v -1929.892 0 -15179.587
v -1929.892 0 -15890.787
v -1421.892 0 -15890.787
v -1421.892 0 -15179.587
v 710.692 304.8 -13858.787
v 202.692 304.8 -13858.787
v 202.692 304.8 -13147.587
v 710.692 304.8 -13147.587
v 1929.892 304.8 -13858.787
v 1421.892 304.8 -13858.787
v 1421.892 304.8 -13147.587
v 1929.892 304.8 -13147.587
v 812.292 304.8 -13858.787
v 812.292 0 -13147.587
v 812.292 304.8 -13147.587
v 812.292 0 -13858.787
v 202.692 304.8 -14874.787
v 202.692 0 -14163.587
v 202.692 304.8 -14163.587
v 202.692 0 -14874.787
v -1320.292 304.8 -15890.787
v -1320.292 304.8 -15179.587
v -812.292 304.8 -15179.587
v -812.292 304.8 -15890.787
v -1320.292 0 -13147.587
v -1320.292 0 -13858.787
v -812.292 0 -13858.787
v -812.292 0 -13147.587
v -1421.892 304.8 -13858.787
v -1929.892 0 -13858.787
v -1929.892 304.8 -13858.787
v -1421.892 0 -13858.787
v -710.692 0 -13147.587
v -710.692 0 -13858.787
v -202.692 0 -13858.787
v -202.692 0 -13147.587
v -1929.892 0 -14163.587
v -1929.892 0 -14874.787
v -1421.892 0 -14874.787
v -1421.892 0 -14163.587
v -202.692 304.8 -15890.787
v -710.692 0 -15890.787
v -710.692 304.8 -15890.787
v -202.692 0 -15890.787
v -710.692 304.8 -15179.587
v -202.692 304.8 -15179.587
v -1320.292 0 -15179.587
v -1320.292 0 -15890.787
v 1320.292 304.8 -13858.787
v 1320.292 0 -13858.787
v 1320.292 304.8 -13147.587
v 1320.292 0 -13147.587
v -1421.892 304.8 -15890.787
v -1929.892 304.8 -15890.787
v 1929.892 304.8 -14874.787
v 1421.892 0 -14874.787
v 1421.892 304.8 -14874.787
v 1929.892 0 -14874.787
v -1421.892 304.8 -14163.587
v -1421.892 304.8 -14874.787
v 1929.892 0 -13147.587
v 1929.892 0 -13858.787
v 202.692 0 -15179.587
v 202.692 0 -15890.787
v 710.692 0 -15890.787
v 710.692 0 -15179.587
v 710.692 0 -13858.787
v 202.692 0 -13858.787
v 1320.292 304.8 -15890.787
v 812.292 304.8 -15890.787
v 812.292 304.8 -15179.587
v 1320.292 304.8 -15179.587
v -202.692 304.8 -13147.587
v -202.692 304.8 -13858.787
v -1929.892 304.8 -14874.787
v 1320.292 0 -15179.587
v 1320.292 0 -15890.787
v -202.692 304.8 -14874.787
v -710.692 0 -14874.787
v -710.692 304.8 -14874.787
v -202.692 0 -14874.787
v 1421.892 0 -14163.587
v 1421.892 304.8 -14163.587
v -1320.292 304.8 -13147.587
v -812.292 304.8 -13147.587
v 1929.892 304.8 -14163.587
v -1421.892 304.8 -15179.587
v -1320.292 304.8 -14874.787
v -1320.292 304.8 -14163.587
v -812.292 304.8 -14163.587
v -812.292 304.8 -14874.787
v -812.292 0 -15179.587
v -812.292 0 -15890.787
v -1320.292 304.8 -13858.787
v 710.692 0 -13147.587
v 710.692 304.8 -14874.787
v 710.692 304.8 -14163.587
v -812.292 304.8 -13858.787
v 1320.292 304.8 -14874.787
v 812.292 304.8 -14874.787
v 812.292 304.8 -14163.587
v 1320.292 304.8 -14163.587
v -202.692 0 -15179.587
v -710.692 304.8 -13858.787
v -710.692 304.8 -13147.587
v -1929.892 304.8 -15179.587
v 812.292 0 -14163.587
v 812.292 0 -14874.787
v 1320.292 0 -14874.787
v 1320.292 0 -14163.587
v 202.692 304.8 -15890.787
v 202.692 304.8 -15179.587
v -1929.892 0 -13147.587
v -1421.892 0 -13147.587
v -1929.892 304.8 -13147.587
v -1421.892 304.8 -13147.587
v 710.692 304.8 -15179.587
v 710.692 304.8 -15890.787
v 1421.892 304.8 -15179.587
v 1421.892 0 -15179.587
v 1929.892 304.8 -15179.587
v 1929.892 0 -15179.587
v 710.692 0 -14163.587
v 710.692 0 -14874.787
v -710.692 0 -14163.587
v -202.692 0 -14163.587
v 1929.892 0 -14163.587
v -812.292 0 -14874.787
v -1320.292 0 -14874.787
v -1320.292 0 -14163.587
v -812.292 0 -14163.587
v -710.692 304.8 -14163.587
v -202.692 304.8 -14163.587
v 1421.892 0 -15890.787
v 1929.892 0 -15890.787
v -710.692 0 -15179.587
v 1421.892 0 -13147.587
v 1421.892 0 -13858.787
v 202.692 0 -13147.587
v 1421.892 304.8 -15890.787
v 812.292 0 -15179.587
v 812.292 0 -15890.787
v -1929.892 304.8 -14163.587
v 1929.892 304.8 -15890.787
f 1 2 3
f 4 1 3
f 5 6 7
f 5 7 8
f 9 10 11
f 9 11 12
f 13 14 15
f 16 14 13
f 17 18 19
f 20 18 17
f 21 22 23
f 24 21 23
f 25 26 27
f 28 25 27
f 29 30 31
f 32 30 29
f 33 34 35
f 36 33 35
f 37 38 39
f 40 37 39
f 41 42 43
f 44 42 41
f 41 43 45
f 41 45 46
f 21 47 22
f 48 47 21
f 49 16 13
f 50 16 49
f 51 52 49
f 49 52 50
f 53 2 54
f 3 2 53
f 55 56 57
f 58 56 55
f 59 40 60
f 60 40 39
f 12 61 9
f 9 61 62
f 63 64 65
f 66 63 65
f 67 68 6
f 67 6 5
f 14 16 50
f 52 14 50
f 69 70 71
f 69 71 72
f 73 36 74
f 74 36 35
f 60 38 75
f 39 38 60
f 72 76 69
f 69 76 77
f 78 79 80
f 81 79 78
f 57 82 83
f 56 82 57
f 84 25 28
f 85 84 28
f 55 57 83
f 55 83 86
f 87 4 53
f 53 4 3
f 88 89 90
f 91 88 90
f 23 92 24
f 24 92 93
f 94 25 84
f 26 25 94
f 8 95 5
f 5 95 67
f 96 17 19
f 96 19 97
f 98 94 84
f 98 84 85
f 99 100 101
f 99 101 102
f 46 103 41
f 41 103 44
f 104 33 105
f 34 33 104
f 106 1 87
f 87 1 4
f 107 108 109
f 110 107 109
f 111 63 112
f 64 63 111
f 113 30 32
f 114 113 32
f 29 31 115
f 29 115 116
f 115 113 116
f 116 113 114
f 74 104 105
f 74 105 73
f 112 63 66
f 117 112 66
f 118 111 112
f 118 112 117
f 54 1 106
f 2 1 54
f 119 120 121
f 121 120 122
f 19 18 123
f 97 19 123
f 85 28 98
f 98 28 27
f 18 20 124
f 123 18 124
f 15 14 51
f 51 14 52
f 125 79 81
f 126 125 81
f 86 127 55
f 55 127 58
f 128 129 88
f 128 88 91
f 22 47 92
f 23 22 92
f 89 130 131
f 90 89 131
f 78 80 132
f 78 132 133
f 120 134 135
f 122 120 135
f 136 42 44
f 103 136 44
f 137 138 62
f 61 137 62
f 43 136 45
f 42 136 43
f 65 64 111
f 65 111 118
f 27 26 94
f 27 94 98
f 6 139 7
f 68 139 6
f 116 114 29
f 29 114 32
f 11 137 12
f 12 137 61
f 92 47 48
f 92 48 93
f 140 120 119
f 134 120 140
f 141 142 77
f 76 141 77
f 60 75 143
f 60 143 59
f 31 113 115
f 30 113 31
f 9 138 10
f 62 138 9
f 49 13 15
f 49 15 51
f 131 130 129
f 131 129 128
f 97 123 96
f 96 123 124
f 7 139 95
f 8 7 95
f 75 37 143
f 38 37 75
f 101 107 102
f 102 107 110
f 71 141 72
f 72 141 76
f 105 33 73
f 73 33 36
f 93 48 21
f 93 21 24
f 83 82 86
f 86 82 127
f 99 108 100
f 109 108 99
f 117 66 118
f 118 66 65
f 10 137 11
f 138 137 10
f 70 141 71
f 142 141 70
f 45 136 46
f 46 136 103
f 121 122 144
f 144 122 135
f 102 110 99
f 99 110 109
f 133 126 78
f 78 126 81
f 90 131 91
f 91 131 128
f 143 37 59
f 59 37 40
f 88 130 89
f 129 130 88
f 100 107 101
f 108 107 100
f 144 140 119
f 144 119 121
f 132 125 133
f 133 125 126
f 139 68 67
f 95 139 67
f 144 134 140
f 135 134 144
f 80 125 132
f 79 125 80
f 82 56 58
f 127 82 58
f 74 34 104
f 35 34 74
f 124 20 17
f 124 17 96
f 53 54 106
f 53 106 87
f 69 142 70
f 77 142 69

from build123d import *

# Parameters (mm, degrees)
FIRST_CLASS_SEAT_2_W       = 508.000000102
FIRST_CLASS_SEAT_2_H       = 711.199999899
FIRST_CLASS_SEAT_DEPTH     = 304.8
FIRST_CLASS_SEAT_2_2_DEPTH = 304.8
FIRST_CLASS_SEAT_2_W_2     = 508.000000101
FIRST_CLASS_SEAT_3_DEPTH   = 304.8
FIRST_CLASS_SEAT_2_H_2     = 711.199999898
FIRST_CLASS_SEAT_4_DEPTH   = 304.8
FIRST_CLASS_SEAT_5_DEPTH   = 304.8
FIRST_CLASS_SEAT_6_DEPTH   = 304.8
FIRST_CLASS_SEAT_7_DEPTH   = 304.8
FIRST_CLASS_SEAT_8_DEPTH   = 304.8
FIRST_CLASS_SEAT_9_DEPTH   = 304.8
FIRST_CLASS_SEAT_10_DEPTH  = 304.8
FIRST_CLASS_SEAT_11_DEPTH  = 304.8
FIRST_CLASS_SEAT_12_DEPTH  = 304.8
FIRST_CLASS_SEAT_13_DEPTH  = 304.8
FIRST_CLASS_SEAT_14_DEPTH  = 304.8
FIRST_CLASS_SEAT_15_DEPTH  = 304.8
FIRST_CLASS_SEAT_16_DEPTH  = 304.8
FIRST_CLASS_SEAT_17_DEPTH  = 304.8
FIRST_CLASS_SEAT_18_DEPTH  = 304.8


with BuildPart() as part:
    # First Class Seat 2 → First Class Seat (new body)
    with BuildSketch(Plane(origin=(0, 0, 0), x_dir=(1, 0, 0), z_dir=(0, 1, 0))):
        with Locations((-1066.291998811, 13503.187169787)):
            Rectangle(FIRST_CLASS_SEAT_2_W, FIRST_CLASS_SEAT_2_H)
    extrude(amount=FIRST_CLASS_SEAT_DEPTH)


with BuildPart() as body_2:
    # First Class Seat 2 → First Class Seat 2 2 (new body)
    with BuildSketch(Plane(origin=(0, 0, 0), x_dir=(1, 0, 0), z_dir=(0, 1, 0))):
        with Locations((-1675.891998933, 13503.187169787)):
            Rectangle(FIRST_CLASS_SEAT_2_W, FIRST_CLASS_SEAT_2_H)
    extrude(amount=FIRST_CLASS_SEAT_2_2_DEPTH)


with BuildPart() as body_3:
    # First Class Seat 2 → First Class Seat 3 (new body)
    with BuildSketch(Plane(origin=(0, 0, 0), x_dir=(1, 0, 0), z_dir=(0, 1, 0))):
        with Locations((-456.691998689, 13503.187169787)):
            Rectangle(FIRST_CLASS_SEAT_2_W_2, FIRST_CLASS_SEAT_2_H)
    extrude(amount=FIRST_CLASS_SEAT_3_DEPTH)


with BuildPart() as body_4:
    # First Class Seat 2 → First Class Seat 4 (new body)
    with BuildSketch(Plane(origin=(0, 0, 0), x_dir=(1, 0, 0), z_dir=(0, 1, 0))):
        with Locations((-1066.291998811, 14519.187169685)):
            Rectangle(FIRST_CLASS_SEAT_2_W, FIRST_CLASS_SEAT_2_H_2)
    extrude(amount=FIRST_CLASS_SEAT_4_DEPTH)


with BuildPart() as body_5:
    # First Class Seat 2 → First Class Seat 5 (new body)
    with BuildSketch(Plane(origin=(0, 0, 0), x_dir=(1, 0, 0), z_dir=(0, 1, 0))):
        with Locations((-456.691998689, 14519.187169685)):
            Rectangle(FIRST_CLASS_SEAT_2_W_2, FIRST_CLASS_SEAT_2_H_2)
    extrude(amount=FIRST_CLASS_SEAT_5_DEPTH)


with BuildPart() as body_6:
    # First Class Seat 2 → First Class Seat 6 (new body)
    with BuildSketch(Plane(origin=(0, 0, 0), x_dir=(1, 0, 0), z_dir=(0, 1, 0))):
        with Locations((-1066.291998811, 15535.187169583)):
            Rectangle(FIRST_CLASS_SEAT_2_W, FIRST_CLASS_SEAT_2_H_2)
    extrude(amount=FIRST_CLASS_SEAT_6_DEPTH)


with BuildPart() as body_7:
    # First Class Seat 2 → First Class Seat 7 (new body)
    with BuildSketch(Plane(origin=(0, 0, 0), x_dir=(1, 0, 0), z_dir=(0, 1, 0))):
        with Locations((-456.691998689, 15535.187169583)):
            Rectangle(FIRST_CLASS_SEAT_2_W_2, FIRST_CLASS_SEAT_2_H_2)
    extrude(amount=FIRST_CLASS_SEAT_7_DEPTH)


with BuildPart() as body_8:
    # First Class Seat 2 → First Class Seat 8 (new body)
    with BuildSketch(Plane(origin=(0, 0, 0), x_dir=(1, 0, 0), z_dir=(0, 1, 0))):
        with Locations((-1675.891998933, 14519.187169685)):
            Rectangle(FIRST_CLASS_SEAT_2_W, FIRST_CLASS_SEAT_2_H_2)
    extrude(amount=FIRST_CLASS_SEAT_8_DEPTH)


with BuildPart() as body_9:
    # First Class Seat 2 → First Class Seat 9 (new body)
    with BuildSketch(Plane(origin=(0, 0, 0), x_dir=(1, 0, 0), z_dir=(0, 1, 0))):
        with Locations((-1675.891998933, 15535.187169583)):
            Rectangle(FIRST_CLASS_SEAT_2_W, FIRST_CLASS_SEAT_2_H_2)
    extrude(amount=FIRST_CLASS_SEAT_9_DEPTH)


with BuildPart() as body_10:
    # First Class Seat 2 → First Class Seat 10 (new body)
    with BuildSketch(Plane(origin=(0, 0, 0), x_dir=(1, 0, 0), z_dir=(0, 1, 0))):
        with Locations((1675.891998933, 15535.187169583)):
            Rectangle(FIRST_CLASS_SEAT_2_W, FIRST_CLASS_SEAT_2_H_2)
    extrude(amount=FIRST_CLASS_SEAT_10_DEPTH)


with BuildPart() as body_11:
    # First Class Seat 2 → First Class Seat 11 (new body)
    with BuildSketch(Plane(origin=(0, 0, 0), x_dir=(1, 0, 0), z_dir=(0, 1, 0))):
        with Locations((1675.891998933, 14519.187169685)):
            Rectangle(FIRST_CLASS_SEAT_2_W, FIRST_CLASS_SEAT_2_H_2)
    extrude(amount=FIRST_CLASS_SEAT_11_DEPTH)


with BuildPart() as body_12:
    # First Class Seat 2 → First Class Seat 12 (new body)
    with BuildSketch(Plane(origin=(0, 0, 0), x_dir=(1, 0, 0), z_dir=(0, 1, 0))):
        with Locations((456.691998689, 15535.187169583)):
            Rectangle(FIRST_CLASS_SEAT_2_W_2, FIRST_CLASS_SEAT_2_H_2)
    extrude(amount=FIRST_CLASS_SEAT_12_DEPTH)


with BuildPart() as body_13:
    # First Class Seat 2 → First Class Seat 13 (new body)
    with BuildSketch(Plane(origin=(0, 0, 0), x_dir=(1, 0, 0), z_dir=(0, 1, 0))):
        with Locations((1066.291998811, 15535.187169583)):
            Rectangle(FIRST_CLASS_SEAT_2_W, FIRST_CLASS_SEAT_2_H_2)
    extrude(amount=FIRST_CLASS_SEAT_13_DEPTH)


with BuildPart() as body_14:
    # First Class Seat 2 → First Class Seat 14 (new body)
    with BuildSketch(Plane(origin=(0, 0, 0), x_dir=(1, 0, 0), z_dir=(0, 1, 0))):
        with Locations((456.691998689, 14519.187169685)):
            Rectangle(FIRST_CLASS_SEAT_2_W_2, FIRST_CLASS_SEAT_2_H_2)
    extrude(amount=FIRST_CLASS_SEAT_14_DEPTH)


with BuildPart() as body_15:
    # First Class Seat 2 → First Class Seat 15 (new body)
    with BuildSketch(Plane(origin=(0, 0, 0), x_dir=(1, 0, 0), z_dir=(0, 1, 0))):
        with Locations((1066.291998811, 14519.187169685)):
            Rectangle(FIRST_CLASS_SEAT_2_W, FIRST_CLASS_SEAT_2_H_2)
    extrude(amount=FIRST_CLASS_SEAT_15_DEPTH)


with BuildPart() as body_16:
    # First Class Seat 2 → First Class Seat 16 (new body)
    with BuildSketch(Plane(origin=(0, 0, 0), x_dir=(1, 0, 0), z_dir=(0, 1, 0))):
        with Locations((456.691998689, 13503.187169787)):
            Rectangle(FIRST_CLASS_SEAT_2_W_2, FIRST_CLASS_SEAT_2_H)
    extrude(amount=FIRST_CLASS_SEAT_16_DEPTH)


with BuildPart() as body_17:
    # First Class Seat 2 → First Class Seat 17 (new body)
    with BuildSketch(Plane(origin=(0, 0, 0), x_dir=(1, 0, 0), z_dir=(0, 1, 0))):
        with Locations((1066.291998811, 13503.187169787)):
            Rectangle(FIRST_CLASS_SEAT_2_W, FIRST_CLASS_SEAT_2_H)
    extrude(amount=FIRST_CLASS_SEAT_17_DEPTH)


with BuildPart() as body_18:
    # First Class Seat 2 → First Class Seat 18 (new body)
    with BuildSketch(Plane(origin=(0, 0, 0), x_dir=(1, 0, 0), z_dir=(0, 1, 0))):
        with Locations((1675.891998933, 13503.187169787)):
            Rectangle(FIRST_CLASS_SEAT_2_W, FIRST_CLASS_SEAT_2_H)
    extrude(amount=FIRST_CLASS_SEAT_18_DEPTH)


solid = Compound([part.part, body_2.part, body_3.part, body_4.part, body_5.part, body_6.part, body_7.part, body_8.part, body_9.part, body_10.part, body_11.part, body_12.part, body_13.part, body_14.part, body_15.part, body_16.part, body_17.part, body_18.part])
